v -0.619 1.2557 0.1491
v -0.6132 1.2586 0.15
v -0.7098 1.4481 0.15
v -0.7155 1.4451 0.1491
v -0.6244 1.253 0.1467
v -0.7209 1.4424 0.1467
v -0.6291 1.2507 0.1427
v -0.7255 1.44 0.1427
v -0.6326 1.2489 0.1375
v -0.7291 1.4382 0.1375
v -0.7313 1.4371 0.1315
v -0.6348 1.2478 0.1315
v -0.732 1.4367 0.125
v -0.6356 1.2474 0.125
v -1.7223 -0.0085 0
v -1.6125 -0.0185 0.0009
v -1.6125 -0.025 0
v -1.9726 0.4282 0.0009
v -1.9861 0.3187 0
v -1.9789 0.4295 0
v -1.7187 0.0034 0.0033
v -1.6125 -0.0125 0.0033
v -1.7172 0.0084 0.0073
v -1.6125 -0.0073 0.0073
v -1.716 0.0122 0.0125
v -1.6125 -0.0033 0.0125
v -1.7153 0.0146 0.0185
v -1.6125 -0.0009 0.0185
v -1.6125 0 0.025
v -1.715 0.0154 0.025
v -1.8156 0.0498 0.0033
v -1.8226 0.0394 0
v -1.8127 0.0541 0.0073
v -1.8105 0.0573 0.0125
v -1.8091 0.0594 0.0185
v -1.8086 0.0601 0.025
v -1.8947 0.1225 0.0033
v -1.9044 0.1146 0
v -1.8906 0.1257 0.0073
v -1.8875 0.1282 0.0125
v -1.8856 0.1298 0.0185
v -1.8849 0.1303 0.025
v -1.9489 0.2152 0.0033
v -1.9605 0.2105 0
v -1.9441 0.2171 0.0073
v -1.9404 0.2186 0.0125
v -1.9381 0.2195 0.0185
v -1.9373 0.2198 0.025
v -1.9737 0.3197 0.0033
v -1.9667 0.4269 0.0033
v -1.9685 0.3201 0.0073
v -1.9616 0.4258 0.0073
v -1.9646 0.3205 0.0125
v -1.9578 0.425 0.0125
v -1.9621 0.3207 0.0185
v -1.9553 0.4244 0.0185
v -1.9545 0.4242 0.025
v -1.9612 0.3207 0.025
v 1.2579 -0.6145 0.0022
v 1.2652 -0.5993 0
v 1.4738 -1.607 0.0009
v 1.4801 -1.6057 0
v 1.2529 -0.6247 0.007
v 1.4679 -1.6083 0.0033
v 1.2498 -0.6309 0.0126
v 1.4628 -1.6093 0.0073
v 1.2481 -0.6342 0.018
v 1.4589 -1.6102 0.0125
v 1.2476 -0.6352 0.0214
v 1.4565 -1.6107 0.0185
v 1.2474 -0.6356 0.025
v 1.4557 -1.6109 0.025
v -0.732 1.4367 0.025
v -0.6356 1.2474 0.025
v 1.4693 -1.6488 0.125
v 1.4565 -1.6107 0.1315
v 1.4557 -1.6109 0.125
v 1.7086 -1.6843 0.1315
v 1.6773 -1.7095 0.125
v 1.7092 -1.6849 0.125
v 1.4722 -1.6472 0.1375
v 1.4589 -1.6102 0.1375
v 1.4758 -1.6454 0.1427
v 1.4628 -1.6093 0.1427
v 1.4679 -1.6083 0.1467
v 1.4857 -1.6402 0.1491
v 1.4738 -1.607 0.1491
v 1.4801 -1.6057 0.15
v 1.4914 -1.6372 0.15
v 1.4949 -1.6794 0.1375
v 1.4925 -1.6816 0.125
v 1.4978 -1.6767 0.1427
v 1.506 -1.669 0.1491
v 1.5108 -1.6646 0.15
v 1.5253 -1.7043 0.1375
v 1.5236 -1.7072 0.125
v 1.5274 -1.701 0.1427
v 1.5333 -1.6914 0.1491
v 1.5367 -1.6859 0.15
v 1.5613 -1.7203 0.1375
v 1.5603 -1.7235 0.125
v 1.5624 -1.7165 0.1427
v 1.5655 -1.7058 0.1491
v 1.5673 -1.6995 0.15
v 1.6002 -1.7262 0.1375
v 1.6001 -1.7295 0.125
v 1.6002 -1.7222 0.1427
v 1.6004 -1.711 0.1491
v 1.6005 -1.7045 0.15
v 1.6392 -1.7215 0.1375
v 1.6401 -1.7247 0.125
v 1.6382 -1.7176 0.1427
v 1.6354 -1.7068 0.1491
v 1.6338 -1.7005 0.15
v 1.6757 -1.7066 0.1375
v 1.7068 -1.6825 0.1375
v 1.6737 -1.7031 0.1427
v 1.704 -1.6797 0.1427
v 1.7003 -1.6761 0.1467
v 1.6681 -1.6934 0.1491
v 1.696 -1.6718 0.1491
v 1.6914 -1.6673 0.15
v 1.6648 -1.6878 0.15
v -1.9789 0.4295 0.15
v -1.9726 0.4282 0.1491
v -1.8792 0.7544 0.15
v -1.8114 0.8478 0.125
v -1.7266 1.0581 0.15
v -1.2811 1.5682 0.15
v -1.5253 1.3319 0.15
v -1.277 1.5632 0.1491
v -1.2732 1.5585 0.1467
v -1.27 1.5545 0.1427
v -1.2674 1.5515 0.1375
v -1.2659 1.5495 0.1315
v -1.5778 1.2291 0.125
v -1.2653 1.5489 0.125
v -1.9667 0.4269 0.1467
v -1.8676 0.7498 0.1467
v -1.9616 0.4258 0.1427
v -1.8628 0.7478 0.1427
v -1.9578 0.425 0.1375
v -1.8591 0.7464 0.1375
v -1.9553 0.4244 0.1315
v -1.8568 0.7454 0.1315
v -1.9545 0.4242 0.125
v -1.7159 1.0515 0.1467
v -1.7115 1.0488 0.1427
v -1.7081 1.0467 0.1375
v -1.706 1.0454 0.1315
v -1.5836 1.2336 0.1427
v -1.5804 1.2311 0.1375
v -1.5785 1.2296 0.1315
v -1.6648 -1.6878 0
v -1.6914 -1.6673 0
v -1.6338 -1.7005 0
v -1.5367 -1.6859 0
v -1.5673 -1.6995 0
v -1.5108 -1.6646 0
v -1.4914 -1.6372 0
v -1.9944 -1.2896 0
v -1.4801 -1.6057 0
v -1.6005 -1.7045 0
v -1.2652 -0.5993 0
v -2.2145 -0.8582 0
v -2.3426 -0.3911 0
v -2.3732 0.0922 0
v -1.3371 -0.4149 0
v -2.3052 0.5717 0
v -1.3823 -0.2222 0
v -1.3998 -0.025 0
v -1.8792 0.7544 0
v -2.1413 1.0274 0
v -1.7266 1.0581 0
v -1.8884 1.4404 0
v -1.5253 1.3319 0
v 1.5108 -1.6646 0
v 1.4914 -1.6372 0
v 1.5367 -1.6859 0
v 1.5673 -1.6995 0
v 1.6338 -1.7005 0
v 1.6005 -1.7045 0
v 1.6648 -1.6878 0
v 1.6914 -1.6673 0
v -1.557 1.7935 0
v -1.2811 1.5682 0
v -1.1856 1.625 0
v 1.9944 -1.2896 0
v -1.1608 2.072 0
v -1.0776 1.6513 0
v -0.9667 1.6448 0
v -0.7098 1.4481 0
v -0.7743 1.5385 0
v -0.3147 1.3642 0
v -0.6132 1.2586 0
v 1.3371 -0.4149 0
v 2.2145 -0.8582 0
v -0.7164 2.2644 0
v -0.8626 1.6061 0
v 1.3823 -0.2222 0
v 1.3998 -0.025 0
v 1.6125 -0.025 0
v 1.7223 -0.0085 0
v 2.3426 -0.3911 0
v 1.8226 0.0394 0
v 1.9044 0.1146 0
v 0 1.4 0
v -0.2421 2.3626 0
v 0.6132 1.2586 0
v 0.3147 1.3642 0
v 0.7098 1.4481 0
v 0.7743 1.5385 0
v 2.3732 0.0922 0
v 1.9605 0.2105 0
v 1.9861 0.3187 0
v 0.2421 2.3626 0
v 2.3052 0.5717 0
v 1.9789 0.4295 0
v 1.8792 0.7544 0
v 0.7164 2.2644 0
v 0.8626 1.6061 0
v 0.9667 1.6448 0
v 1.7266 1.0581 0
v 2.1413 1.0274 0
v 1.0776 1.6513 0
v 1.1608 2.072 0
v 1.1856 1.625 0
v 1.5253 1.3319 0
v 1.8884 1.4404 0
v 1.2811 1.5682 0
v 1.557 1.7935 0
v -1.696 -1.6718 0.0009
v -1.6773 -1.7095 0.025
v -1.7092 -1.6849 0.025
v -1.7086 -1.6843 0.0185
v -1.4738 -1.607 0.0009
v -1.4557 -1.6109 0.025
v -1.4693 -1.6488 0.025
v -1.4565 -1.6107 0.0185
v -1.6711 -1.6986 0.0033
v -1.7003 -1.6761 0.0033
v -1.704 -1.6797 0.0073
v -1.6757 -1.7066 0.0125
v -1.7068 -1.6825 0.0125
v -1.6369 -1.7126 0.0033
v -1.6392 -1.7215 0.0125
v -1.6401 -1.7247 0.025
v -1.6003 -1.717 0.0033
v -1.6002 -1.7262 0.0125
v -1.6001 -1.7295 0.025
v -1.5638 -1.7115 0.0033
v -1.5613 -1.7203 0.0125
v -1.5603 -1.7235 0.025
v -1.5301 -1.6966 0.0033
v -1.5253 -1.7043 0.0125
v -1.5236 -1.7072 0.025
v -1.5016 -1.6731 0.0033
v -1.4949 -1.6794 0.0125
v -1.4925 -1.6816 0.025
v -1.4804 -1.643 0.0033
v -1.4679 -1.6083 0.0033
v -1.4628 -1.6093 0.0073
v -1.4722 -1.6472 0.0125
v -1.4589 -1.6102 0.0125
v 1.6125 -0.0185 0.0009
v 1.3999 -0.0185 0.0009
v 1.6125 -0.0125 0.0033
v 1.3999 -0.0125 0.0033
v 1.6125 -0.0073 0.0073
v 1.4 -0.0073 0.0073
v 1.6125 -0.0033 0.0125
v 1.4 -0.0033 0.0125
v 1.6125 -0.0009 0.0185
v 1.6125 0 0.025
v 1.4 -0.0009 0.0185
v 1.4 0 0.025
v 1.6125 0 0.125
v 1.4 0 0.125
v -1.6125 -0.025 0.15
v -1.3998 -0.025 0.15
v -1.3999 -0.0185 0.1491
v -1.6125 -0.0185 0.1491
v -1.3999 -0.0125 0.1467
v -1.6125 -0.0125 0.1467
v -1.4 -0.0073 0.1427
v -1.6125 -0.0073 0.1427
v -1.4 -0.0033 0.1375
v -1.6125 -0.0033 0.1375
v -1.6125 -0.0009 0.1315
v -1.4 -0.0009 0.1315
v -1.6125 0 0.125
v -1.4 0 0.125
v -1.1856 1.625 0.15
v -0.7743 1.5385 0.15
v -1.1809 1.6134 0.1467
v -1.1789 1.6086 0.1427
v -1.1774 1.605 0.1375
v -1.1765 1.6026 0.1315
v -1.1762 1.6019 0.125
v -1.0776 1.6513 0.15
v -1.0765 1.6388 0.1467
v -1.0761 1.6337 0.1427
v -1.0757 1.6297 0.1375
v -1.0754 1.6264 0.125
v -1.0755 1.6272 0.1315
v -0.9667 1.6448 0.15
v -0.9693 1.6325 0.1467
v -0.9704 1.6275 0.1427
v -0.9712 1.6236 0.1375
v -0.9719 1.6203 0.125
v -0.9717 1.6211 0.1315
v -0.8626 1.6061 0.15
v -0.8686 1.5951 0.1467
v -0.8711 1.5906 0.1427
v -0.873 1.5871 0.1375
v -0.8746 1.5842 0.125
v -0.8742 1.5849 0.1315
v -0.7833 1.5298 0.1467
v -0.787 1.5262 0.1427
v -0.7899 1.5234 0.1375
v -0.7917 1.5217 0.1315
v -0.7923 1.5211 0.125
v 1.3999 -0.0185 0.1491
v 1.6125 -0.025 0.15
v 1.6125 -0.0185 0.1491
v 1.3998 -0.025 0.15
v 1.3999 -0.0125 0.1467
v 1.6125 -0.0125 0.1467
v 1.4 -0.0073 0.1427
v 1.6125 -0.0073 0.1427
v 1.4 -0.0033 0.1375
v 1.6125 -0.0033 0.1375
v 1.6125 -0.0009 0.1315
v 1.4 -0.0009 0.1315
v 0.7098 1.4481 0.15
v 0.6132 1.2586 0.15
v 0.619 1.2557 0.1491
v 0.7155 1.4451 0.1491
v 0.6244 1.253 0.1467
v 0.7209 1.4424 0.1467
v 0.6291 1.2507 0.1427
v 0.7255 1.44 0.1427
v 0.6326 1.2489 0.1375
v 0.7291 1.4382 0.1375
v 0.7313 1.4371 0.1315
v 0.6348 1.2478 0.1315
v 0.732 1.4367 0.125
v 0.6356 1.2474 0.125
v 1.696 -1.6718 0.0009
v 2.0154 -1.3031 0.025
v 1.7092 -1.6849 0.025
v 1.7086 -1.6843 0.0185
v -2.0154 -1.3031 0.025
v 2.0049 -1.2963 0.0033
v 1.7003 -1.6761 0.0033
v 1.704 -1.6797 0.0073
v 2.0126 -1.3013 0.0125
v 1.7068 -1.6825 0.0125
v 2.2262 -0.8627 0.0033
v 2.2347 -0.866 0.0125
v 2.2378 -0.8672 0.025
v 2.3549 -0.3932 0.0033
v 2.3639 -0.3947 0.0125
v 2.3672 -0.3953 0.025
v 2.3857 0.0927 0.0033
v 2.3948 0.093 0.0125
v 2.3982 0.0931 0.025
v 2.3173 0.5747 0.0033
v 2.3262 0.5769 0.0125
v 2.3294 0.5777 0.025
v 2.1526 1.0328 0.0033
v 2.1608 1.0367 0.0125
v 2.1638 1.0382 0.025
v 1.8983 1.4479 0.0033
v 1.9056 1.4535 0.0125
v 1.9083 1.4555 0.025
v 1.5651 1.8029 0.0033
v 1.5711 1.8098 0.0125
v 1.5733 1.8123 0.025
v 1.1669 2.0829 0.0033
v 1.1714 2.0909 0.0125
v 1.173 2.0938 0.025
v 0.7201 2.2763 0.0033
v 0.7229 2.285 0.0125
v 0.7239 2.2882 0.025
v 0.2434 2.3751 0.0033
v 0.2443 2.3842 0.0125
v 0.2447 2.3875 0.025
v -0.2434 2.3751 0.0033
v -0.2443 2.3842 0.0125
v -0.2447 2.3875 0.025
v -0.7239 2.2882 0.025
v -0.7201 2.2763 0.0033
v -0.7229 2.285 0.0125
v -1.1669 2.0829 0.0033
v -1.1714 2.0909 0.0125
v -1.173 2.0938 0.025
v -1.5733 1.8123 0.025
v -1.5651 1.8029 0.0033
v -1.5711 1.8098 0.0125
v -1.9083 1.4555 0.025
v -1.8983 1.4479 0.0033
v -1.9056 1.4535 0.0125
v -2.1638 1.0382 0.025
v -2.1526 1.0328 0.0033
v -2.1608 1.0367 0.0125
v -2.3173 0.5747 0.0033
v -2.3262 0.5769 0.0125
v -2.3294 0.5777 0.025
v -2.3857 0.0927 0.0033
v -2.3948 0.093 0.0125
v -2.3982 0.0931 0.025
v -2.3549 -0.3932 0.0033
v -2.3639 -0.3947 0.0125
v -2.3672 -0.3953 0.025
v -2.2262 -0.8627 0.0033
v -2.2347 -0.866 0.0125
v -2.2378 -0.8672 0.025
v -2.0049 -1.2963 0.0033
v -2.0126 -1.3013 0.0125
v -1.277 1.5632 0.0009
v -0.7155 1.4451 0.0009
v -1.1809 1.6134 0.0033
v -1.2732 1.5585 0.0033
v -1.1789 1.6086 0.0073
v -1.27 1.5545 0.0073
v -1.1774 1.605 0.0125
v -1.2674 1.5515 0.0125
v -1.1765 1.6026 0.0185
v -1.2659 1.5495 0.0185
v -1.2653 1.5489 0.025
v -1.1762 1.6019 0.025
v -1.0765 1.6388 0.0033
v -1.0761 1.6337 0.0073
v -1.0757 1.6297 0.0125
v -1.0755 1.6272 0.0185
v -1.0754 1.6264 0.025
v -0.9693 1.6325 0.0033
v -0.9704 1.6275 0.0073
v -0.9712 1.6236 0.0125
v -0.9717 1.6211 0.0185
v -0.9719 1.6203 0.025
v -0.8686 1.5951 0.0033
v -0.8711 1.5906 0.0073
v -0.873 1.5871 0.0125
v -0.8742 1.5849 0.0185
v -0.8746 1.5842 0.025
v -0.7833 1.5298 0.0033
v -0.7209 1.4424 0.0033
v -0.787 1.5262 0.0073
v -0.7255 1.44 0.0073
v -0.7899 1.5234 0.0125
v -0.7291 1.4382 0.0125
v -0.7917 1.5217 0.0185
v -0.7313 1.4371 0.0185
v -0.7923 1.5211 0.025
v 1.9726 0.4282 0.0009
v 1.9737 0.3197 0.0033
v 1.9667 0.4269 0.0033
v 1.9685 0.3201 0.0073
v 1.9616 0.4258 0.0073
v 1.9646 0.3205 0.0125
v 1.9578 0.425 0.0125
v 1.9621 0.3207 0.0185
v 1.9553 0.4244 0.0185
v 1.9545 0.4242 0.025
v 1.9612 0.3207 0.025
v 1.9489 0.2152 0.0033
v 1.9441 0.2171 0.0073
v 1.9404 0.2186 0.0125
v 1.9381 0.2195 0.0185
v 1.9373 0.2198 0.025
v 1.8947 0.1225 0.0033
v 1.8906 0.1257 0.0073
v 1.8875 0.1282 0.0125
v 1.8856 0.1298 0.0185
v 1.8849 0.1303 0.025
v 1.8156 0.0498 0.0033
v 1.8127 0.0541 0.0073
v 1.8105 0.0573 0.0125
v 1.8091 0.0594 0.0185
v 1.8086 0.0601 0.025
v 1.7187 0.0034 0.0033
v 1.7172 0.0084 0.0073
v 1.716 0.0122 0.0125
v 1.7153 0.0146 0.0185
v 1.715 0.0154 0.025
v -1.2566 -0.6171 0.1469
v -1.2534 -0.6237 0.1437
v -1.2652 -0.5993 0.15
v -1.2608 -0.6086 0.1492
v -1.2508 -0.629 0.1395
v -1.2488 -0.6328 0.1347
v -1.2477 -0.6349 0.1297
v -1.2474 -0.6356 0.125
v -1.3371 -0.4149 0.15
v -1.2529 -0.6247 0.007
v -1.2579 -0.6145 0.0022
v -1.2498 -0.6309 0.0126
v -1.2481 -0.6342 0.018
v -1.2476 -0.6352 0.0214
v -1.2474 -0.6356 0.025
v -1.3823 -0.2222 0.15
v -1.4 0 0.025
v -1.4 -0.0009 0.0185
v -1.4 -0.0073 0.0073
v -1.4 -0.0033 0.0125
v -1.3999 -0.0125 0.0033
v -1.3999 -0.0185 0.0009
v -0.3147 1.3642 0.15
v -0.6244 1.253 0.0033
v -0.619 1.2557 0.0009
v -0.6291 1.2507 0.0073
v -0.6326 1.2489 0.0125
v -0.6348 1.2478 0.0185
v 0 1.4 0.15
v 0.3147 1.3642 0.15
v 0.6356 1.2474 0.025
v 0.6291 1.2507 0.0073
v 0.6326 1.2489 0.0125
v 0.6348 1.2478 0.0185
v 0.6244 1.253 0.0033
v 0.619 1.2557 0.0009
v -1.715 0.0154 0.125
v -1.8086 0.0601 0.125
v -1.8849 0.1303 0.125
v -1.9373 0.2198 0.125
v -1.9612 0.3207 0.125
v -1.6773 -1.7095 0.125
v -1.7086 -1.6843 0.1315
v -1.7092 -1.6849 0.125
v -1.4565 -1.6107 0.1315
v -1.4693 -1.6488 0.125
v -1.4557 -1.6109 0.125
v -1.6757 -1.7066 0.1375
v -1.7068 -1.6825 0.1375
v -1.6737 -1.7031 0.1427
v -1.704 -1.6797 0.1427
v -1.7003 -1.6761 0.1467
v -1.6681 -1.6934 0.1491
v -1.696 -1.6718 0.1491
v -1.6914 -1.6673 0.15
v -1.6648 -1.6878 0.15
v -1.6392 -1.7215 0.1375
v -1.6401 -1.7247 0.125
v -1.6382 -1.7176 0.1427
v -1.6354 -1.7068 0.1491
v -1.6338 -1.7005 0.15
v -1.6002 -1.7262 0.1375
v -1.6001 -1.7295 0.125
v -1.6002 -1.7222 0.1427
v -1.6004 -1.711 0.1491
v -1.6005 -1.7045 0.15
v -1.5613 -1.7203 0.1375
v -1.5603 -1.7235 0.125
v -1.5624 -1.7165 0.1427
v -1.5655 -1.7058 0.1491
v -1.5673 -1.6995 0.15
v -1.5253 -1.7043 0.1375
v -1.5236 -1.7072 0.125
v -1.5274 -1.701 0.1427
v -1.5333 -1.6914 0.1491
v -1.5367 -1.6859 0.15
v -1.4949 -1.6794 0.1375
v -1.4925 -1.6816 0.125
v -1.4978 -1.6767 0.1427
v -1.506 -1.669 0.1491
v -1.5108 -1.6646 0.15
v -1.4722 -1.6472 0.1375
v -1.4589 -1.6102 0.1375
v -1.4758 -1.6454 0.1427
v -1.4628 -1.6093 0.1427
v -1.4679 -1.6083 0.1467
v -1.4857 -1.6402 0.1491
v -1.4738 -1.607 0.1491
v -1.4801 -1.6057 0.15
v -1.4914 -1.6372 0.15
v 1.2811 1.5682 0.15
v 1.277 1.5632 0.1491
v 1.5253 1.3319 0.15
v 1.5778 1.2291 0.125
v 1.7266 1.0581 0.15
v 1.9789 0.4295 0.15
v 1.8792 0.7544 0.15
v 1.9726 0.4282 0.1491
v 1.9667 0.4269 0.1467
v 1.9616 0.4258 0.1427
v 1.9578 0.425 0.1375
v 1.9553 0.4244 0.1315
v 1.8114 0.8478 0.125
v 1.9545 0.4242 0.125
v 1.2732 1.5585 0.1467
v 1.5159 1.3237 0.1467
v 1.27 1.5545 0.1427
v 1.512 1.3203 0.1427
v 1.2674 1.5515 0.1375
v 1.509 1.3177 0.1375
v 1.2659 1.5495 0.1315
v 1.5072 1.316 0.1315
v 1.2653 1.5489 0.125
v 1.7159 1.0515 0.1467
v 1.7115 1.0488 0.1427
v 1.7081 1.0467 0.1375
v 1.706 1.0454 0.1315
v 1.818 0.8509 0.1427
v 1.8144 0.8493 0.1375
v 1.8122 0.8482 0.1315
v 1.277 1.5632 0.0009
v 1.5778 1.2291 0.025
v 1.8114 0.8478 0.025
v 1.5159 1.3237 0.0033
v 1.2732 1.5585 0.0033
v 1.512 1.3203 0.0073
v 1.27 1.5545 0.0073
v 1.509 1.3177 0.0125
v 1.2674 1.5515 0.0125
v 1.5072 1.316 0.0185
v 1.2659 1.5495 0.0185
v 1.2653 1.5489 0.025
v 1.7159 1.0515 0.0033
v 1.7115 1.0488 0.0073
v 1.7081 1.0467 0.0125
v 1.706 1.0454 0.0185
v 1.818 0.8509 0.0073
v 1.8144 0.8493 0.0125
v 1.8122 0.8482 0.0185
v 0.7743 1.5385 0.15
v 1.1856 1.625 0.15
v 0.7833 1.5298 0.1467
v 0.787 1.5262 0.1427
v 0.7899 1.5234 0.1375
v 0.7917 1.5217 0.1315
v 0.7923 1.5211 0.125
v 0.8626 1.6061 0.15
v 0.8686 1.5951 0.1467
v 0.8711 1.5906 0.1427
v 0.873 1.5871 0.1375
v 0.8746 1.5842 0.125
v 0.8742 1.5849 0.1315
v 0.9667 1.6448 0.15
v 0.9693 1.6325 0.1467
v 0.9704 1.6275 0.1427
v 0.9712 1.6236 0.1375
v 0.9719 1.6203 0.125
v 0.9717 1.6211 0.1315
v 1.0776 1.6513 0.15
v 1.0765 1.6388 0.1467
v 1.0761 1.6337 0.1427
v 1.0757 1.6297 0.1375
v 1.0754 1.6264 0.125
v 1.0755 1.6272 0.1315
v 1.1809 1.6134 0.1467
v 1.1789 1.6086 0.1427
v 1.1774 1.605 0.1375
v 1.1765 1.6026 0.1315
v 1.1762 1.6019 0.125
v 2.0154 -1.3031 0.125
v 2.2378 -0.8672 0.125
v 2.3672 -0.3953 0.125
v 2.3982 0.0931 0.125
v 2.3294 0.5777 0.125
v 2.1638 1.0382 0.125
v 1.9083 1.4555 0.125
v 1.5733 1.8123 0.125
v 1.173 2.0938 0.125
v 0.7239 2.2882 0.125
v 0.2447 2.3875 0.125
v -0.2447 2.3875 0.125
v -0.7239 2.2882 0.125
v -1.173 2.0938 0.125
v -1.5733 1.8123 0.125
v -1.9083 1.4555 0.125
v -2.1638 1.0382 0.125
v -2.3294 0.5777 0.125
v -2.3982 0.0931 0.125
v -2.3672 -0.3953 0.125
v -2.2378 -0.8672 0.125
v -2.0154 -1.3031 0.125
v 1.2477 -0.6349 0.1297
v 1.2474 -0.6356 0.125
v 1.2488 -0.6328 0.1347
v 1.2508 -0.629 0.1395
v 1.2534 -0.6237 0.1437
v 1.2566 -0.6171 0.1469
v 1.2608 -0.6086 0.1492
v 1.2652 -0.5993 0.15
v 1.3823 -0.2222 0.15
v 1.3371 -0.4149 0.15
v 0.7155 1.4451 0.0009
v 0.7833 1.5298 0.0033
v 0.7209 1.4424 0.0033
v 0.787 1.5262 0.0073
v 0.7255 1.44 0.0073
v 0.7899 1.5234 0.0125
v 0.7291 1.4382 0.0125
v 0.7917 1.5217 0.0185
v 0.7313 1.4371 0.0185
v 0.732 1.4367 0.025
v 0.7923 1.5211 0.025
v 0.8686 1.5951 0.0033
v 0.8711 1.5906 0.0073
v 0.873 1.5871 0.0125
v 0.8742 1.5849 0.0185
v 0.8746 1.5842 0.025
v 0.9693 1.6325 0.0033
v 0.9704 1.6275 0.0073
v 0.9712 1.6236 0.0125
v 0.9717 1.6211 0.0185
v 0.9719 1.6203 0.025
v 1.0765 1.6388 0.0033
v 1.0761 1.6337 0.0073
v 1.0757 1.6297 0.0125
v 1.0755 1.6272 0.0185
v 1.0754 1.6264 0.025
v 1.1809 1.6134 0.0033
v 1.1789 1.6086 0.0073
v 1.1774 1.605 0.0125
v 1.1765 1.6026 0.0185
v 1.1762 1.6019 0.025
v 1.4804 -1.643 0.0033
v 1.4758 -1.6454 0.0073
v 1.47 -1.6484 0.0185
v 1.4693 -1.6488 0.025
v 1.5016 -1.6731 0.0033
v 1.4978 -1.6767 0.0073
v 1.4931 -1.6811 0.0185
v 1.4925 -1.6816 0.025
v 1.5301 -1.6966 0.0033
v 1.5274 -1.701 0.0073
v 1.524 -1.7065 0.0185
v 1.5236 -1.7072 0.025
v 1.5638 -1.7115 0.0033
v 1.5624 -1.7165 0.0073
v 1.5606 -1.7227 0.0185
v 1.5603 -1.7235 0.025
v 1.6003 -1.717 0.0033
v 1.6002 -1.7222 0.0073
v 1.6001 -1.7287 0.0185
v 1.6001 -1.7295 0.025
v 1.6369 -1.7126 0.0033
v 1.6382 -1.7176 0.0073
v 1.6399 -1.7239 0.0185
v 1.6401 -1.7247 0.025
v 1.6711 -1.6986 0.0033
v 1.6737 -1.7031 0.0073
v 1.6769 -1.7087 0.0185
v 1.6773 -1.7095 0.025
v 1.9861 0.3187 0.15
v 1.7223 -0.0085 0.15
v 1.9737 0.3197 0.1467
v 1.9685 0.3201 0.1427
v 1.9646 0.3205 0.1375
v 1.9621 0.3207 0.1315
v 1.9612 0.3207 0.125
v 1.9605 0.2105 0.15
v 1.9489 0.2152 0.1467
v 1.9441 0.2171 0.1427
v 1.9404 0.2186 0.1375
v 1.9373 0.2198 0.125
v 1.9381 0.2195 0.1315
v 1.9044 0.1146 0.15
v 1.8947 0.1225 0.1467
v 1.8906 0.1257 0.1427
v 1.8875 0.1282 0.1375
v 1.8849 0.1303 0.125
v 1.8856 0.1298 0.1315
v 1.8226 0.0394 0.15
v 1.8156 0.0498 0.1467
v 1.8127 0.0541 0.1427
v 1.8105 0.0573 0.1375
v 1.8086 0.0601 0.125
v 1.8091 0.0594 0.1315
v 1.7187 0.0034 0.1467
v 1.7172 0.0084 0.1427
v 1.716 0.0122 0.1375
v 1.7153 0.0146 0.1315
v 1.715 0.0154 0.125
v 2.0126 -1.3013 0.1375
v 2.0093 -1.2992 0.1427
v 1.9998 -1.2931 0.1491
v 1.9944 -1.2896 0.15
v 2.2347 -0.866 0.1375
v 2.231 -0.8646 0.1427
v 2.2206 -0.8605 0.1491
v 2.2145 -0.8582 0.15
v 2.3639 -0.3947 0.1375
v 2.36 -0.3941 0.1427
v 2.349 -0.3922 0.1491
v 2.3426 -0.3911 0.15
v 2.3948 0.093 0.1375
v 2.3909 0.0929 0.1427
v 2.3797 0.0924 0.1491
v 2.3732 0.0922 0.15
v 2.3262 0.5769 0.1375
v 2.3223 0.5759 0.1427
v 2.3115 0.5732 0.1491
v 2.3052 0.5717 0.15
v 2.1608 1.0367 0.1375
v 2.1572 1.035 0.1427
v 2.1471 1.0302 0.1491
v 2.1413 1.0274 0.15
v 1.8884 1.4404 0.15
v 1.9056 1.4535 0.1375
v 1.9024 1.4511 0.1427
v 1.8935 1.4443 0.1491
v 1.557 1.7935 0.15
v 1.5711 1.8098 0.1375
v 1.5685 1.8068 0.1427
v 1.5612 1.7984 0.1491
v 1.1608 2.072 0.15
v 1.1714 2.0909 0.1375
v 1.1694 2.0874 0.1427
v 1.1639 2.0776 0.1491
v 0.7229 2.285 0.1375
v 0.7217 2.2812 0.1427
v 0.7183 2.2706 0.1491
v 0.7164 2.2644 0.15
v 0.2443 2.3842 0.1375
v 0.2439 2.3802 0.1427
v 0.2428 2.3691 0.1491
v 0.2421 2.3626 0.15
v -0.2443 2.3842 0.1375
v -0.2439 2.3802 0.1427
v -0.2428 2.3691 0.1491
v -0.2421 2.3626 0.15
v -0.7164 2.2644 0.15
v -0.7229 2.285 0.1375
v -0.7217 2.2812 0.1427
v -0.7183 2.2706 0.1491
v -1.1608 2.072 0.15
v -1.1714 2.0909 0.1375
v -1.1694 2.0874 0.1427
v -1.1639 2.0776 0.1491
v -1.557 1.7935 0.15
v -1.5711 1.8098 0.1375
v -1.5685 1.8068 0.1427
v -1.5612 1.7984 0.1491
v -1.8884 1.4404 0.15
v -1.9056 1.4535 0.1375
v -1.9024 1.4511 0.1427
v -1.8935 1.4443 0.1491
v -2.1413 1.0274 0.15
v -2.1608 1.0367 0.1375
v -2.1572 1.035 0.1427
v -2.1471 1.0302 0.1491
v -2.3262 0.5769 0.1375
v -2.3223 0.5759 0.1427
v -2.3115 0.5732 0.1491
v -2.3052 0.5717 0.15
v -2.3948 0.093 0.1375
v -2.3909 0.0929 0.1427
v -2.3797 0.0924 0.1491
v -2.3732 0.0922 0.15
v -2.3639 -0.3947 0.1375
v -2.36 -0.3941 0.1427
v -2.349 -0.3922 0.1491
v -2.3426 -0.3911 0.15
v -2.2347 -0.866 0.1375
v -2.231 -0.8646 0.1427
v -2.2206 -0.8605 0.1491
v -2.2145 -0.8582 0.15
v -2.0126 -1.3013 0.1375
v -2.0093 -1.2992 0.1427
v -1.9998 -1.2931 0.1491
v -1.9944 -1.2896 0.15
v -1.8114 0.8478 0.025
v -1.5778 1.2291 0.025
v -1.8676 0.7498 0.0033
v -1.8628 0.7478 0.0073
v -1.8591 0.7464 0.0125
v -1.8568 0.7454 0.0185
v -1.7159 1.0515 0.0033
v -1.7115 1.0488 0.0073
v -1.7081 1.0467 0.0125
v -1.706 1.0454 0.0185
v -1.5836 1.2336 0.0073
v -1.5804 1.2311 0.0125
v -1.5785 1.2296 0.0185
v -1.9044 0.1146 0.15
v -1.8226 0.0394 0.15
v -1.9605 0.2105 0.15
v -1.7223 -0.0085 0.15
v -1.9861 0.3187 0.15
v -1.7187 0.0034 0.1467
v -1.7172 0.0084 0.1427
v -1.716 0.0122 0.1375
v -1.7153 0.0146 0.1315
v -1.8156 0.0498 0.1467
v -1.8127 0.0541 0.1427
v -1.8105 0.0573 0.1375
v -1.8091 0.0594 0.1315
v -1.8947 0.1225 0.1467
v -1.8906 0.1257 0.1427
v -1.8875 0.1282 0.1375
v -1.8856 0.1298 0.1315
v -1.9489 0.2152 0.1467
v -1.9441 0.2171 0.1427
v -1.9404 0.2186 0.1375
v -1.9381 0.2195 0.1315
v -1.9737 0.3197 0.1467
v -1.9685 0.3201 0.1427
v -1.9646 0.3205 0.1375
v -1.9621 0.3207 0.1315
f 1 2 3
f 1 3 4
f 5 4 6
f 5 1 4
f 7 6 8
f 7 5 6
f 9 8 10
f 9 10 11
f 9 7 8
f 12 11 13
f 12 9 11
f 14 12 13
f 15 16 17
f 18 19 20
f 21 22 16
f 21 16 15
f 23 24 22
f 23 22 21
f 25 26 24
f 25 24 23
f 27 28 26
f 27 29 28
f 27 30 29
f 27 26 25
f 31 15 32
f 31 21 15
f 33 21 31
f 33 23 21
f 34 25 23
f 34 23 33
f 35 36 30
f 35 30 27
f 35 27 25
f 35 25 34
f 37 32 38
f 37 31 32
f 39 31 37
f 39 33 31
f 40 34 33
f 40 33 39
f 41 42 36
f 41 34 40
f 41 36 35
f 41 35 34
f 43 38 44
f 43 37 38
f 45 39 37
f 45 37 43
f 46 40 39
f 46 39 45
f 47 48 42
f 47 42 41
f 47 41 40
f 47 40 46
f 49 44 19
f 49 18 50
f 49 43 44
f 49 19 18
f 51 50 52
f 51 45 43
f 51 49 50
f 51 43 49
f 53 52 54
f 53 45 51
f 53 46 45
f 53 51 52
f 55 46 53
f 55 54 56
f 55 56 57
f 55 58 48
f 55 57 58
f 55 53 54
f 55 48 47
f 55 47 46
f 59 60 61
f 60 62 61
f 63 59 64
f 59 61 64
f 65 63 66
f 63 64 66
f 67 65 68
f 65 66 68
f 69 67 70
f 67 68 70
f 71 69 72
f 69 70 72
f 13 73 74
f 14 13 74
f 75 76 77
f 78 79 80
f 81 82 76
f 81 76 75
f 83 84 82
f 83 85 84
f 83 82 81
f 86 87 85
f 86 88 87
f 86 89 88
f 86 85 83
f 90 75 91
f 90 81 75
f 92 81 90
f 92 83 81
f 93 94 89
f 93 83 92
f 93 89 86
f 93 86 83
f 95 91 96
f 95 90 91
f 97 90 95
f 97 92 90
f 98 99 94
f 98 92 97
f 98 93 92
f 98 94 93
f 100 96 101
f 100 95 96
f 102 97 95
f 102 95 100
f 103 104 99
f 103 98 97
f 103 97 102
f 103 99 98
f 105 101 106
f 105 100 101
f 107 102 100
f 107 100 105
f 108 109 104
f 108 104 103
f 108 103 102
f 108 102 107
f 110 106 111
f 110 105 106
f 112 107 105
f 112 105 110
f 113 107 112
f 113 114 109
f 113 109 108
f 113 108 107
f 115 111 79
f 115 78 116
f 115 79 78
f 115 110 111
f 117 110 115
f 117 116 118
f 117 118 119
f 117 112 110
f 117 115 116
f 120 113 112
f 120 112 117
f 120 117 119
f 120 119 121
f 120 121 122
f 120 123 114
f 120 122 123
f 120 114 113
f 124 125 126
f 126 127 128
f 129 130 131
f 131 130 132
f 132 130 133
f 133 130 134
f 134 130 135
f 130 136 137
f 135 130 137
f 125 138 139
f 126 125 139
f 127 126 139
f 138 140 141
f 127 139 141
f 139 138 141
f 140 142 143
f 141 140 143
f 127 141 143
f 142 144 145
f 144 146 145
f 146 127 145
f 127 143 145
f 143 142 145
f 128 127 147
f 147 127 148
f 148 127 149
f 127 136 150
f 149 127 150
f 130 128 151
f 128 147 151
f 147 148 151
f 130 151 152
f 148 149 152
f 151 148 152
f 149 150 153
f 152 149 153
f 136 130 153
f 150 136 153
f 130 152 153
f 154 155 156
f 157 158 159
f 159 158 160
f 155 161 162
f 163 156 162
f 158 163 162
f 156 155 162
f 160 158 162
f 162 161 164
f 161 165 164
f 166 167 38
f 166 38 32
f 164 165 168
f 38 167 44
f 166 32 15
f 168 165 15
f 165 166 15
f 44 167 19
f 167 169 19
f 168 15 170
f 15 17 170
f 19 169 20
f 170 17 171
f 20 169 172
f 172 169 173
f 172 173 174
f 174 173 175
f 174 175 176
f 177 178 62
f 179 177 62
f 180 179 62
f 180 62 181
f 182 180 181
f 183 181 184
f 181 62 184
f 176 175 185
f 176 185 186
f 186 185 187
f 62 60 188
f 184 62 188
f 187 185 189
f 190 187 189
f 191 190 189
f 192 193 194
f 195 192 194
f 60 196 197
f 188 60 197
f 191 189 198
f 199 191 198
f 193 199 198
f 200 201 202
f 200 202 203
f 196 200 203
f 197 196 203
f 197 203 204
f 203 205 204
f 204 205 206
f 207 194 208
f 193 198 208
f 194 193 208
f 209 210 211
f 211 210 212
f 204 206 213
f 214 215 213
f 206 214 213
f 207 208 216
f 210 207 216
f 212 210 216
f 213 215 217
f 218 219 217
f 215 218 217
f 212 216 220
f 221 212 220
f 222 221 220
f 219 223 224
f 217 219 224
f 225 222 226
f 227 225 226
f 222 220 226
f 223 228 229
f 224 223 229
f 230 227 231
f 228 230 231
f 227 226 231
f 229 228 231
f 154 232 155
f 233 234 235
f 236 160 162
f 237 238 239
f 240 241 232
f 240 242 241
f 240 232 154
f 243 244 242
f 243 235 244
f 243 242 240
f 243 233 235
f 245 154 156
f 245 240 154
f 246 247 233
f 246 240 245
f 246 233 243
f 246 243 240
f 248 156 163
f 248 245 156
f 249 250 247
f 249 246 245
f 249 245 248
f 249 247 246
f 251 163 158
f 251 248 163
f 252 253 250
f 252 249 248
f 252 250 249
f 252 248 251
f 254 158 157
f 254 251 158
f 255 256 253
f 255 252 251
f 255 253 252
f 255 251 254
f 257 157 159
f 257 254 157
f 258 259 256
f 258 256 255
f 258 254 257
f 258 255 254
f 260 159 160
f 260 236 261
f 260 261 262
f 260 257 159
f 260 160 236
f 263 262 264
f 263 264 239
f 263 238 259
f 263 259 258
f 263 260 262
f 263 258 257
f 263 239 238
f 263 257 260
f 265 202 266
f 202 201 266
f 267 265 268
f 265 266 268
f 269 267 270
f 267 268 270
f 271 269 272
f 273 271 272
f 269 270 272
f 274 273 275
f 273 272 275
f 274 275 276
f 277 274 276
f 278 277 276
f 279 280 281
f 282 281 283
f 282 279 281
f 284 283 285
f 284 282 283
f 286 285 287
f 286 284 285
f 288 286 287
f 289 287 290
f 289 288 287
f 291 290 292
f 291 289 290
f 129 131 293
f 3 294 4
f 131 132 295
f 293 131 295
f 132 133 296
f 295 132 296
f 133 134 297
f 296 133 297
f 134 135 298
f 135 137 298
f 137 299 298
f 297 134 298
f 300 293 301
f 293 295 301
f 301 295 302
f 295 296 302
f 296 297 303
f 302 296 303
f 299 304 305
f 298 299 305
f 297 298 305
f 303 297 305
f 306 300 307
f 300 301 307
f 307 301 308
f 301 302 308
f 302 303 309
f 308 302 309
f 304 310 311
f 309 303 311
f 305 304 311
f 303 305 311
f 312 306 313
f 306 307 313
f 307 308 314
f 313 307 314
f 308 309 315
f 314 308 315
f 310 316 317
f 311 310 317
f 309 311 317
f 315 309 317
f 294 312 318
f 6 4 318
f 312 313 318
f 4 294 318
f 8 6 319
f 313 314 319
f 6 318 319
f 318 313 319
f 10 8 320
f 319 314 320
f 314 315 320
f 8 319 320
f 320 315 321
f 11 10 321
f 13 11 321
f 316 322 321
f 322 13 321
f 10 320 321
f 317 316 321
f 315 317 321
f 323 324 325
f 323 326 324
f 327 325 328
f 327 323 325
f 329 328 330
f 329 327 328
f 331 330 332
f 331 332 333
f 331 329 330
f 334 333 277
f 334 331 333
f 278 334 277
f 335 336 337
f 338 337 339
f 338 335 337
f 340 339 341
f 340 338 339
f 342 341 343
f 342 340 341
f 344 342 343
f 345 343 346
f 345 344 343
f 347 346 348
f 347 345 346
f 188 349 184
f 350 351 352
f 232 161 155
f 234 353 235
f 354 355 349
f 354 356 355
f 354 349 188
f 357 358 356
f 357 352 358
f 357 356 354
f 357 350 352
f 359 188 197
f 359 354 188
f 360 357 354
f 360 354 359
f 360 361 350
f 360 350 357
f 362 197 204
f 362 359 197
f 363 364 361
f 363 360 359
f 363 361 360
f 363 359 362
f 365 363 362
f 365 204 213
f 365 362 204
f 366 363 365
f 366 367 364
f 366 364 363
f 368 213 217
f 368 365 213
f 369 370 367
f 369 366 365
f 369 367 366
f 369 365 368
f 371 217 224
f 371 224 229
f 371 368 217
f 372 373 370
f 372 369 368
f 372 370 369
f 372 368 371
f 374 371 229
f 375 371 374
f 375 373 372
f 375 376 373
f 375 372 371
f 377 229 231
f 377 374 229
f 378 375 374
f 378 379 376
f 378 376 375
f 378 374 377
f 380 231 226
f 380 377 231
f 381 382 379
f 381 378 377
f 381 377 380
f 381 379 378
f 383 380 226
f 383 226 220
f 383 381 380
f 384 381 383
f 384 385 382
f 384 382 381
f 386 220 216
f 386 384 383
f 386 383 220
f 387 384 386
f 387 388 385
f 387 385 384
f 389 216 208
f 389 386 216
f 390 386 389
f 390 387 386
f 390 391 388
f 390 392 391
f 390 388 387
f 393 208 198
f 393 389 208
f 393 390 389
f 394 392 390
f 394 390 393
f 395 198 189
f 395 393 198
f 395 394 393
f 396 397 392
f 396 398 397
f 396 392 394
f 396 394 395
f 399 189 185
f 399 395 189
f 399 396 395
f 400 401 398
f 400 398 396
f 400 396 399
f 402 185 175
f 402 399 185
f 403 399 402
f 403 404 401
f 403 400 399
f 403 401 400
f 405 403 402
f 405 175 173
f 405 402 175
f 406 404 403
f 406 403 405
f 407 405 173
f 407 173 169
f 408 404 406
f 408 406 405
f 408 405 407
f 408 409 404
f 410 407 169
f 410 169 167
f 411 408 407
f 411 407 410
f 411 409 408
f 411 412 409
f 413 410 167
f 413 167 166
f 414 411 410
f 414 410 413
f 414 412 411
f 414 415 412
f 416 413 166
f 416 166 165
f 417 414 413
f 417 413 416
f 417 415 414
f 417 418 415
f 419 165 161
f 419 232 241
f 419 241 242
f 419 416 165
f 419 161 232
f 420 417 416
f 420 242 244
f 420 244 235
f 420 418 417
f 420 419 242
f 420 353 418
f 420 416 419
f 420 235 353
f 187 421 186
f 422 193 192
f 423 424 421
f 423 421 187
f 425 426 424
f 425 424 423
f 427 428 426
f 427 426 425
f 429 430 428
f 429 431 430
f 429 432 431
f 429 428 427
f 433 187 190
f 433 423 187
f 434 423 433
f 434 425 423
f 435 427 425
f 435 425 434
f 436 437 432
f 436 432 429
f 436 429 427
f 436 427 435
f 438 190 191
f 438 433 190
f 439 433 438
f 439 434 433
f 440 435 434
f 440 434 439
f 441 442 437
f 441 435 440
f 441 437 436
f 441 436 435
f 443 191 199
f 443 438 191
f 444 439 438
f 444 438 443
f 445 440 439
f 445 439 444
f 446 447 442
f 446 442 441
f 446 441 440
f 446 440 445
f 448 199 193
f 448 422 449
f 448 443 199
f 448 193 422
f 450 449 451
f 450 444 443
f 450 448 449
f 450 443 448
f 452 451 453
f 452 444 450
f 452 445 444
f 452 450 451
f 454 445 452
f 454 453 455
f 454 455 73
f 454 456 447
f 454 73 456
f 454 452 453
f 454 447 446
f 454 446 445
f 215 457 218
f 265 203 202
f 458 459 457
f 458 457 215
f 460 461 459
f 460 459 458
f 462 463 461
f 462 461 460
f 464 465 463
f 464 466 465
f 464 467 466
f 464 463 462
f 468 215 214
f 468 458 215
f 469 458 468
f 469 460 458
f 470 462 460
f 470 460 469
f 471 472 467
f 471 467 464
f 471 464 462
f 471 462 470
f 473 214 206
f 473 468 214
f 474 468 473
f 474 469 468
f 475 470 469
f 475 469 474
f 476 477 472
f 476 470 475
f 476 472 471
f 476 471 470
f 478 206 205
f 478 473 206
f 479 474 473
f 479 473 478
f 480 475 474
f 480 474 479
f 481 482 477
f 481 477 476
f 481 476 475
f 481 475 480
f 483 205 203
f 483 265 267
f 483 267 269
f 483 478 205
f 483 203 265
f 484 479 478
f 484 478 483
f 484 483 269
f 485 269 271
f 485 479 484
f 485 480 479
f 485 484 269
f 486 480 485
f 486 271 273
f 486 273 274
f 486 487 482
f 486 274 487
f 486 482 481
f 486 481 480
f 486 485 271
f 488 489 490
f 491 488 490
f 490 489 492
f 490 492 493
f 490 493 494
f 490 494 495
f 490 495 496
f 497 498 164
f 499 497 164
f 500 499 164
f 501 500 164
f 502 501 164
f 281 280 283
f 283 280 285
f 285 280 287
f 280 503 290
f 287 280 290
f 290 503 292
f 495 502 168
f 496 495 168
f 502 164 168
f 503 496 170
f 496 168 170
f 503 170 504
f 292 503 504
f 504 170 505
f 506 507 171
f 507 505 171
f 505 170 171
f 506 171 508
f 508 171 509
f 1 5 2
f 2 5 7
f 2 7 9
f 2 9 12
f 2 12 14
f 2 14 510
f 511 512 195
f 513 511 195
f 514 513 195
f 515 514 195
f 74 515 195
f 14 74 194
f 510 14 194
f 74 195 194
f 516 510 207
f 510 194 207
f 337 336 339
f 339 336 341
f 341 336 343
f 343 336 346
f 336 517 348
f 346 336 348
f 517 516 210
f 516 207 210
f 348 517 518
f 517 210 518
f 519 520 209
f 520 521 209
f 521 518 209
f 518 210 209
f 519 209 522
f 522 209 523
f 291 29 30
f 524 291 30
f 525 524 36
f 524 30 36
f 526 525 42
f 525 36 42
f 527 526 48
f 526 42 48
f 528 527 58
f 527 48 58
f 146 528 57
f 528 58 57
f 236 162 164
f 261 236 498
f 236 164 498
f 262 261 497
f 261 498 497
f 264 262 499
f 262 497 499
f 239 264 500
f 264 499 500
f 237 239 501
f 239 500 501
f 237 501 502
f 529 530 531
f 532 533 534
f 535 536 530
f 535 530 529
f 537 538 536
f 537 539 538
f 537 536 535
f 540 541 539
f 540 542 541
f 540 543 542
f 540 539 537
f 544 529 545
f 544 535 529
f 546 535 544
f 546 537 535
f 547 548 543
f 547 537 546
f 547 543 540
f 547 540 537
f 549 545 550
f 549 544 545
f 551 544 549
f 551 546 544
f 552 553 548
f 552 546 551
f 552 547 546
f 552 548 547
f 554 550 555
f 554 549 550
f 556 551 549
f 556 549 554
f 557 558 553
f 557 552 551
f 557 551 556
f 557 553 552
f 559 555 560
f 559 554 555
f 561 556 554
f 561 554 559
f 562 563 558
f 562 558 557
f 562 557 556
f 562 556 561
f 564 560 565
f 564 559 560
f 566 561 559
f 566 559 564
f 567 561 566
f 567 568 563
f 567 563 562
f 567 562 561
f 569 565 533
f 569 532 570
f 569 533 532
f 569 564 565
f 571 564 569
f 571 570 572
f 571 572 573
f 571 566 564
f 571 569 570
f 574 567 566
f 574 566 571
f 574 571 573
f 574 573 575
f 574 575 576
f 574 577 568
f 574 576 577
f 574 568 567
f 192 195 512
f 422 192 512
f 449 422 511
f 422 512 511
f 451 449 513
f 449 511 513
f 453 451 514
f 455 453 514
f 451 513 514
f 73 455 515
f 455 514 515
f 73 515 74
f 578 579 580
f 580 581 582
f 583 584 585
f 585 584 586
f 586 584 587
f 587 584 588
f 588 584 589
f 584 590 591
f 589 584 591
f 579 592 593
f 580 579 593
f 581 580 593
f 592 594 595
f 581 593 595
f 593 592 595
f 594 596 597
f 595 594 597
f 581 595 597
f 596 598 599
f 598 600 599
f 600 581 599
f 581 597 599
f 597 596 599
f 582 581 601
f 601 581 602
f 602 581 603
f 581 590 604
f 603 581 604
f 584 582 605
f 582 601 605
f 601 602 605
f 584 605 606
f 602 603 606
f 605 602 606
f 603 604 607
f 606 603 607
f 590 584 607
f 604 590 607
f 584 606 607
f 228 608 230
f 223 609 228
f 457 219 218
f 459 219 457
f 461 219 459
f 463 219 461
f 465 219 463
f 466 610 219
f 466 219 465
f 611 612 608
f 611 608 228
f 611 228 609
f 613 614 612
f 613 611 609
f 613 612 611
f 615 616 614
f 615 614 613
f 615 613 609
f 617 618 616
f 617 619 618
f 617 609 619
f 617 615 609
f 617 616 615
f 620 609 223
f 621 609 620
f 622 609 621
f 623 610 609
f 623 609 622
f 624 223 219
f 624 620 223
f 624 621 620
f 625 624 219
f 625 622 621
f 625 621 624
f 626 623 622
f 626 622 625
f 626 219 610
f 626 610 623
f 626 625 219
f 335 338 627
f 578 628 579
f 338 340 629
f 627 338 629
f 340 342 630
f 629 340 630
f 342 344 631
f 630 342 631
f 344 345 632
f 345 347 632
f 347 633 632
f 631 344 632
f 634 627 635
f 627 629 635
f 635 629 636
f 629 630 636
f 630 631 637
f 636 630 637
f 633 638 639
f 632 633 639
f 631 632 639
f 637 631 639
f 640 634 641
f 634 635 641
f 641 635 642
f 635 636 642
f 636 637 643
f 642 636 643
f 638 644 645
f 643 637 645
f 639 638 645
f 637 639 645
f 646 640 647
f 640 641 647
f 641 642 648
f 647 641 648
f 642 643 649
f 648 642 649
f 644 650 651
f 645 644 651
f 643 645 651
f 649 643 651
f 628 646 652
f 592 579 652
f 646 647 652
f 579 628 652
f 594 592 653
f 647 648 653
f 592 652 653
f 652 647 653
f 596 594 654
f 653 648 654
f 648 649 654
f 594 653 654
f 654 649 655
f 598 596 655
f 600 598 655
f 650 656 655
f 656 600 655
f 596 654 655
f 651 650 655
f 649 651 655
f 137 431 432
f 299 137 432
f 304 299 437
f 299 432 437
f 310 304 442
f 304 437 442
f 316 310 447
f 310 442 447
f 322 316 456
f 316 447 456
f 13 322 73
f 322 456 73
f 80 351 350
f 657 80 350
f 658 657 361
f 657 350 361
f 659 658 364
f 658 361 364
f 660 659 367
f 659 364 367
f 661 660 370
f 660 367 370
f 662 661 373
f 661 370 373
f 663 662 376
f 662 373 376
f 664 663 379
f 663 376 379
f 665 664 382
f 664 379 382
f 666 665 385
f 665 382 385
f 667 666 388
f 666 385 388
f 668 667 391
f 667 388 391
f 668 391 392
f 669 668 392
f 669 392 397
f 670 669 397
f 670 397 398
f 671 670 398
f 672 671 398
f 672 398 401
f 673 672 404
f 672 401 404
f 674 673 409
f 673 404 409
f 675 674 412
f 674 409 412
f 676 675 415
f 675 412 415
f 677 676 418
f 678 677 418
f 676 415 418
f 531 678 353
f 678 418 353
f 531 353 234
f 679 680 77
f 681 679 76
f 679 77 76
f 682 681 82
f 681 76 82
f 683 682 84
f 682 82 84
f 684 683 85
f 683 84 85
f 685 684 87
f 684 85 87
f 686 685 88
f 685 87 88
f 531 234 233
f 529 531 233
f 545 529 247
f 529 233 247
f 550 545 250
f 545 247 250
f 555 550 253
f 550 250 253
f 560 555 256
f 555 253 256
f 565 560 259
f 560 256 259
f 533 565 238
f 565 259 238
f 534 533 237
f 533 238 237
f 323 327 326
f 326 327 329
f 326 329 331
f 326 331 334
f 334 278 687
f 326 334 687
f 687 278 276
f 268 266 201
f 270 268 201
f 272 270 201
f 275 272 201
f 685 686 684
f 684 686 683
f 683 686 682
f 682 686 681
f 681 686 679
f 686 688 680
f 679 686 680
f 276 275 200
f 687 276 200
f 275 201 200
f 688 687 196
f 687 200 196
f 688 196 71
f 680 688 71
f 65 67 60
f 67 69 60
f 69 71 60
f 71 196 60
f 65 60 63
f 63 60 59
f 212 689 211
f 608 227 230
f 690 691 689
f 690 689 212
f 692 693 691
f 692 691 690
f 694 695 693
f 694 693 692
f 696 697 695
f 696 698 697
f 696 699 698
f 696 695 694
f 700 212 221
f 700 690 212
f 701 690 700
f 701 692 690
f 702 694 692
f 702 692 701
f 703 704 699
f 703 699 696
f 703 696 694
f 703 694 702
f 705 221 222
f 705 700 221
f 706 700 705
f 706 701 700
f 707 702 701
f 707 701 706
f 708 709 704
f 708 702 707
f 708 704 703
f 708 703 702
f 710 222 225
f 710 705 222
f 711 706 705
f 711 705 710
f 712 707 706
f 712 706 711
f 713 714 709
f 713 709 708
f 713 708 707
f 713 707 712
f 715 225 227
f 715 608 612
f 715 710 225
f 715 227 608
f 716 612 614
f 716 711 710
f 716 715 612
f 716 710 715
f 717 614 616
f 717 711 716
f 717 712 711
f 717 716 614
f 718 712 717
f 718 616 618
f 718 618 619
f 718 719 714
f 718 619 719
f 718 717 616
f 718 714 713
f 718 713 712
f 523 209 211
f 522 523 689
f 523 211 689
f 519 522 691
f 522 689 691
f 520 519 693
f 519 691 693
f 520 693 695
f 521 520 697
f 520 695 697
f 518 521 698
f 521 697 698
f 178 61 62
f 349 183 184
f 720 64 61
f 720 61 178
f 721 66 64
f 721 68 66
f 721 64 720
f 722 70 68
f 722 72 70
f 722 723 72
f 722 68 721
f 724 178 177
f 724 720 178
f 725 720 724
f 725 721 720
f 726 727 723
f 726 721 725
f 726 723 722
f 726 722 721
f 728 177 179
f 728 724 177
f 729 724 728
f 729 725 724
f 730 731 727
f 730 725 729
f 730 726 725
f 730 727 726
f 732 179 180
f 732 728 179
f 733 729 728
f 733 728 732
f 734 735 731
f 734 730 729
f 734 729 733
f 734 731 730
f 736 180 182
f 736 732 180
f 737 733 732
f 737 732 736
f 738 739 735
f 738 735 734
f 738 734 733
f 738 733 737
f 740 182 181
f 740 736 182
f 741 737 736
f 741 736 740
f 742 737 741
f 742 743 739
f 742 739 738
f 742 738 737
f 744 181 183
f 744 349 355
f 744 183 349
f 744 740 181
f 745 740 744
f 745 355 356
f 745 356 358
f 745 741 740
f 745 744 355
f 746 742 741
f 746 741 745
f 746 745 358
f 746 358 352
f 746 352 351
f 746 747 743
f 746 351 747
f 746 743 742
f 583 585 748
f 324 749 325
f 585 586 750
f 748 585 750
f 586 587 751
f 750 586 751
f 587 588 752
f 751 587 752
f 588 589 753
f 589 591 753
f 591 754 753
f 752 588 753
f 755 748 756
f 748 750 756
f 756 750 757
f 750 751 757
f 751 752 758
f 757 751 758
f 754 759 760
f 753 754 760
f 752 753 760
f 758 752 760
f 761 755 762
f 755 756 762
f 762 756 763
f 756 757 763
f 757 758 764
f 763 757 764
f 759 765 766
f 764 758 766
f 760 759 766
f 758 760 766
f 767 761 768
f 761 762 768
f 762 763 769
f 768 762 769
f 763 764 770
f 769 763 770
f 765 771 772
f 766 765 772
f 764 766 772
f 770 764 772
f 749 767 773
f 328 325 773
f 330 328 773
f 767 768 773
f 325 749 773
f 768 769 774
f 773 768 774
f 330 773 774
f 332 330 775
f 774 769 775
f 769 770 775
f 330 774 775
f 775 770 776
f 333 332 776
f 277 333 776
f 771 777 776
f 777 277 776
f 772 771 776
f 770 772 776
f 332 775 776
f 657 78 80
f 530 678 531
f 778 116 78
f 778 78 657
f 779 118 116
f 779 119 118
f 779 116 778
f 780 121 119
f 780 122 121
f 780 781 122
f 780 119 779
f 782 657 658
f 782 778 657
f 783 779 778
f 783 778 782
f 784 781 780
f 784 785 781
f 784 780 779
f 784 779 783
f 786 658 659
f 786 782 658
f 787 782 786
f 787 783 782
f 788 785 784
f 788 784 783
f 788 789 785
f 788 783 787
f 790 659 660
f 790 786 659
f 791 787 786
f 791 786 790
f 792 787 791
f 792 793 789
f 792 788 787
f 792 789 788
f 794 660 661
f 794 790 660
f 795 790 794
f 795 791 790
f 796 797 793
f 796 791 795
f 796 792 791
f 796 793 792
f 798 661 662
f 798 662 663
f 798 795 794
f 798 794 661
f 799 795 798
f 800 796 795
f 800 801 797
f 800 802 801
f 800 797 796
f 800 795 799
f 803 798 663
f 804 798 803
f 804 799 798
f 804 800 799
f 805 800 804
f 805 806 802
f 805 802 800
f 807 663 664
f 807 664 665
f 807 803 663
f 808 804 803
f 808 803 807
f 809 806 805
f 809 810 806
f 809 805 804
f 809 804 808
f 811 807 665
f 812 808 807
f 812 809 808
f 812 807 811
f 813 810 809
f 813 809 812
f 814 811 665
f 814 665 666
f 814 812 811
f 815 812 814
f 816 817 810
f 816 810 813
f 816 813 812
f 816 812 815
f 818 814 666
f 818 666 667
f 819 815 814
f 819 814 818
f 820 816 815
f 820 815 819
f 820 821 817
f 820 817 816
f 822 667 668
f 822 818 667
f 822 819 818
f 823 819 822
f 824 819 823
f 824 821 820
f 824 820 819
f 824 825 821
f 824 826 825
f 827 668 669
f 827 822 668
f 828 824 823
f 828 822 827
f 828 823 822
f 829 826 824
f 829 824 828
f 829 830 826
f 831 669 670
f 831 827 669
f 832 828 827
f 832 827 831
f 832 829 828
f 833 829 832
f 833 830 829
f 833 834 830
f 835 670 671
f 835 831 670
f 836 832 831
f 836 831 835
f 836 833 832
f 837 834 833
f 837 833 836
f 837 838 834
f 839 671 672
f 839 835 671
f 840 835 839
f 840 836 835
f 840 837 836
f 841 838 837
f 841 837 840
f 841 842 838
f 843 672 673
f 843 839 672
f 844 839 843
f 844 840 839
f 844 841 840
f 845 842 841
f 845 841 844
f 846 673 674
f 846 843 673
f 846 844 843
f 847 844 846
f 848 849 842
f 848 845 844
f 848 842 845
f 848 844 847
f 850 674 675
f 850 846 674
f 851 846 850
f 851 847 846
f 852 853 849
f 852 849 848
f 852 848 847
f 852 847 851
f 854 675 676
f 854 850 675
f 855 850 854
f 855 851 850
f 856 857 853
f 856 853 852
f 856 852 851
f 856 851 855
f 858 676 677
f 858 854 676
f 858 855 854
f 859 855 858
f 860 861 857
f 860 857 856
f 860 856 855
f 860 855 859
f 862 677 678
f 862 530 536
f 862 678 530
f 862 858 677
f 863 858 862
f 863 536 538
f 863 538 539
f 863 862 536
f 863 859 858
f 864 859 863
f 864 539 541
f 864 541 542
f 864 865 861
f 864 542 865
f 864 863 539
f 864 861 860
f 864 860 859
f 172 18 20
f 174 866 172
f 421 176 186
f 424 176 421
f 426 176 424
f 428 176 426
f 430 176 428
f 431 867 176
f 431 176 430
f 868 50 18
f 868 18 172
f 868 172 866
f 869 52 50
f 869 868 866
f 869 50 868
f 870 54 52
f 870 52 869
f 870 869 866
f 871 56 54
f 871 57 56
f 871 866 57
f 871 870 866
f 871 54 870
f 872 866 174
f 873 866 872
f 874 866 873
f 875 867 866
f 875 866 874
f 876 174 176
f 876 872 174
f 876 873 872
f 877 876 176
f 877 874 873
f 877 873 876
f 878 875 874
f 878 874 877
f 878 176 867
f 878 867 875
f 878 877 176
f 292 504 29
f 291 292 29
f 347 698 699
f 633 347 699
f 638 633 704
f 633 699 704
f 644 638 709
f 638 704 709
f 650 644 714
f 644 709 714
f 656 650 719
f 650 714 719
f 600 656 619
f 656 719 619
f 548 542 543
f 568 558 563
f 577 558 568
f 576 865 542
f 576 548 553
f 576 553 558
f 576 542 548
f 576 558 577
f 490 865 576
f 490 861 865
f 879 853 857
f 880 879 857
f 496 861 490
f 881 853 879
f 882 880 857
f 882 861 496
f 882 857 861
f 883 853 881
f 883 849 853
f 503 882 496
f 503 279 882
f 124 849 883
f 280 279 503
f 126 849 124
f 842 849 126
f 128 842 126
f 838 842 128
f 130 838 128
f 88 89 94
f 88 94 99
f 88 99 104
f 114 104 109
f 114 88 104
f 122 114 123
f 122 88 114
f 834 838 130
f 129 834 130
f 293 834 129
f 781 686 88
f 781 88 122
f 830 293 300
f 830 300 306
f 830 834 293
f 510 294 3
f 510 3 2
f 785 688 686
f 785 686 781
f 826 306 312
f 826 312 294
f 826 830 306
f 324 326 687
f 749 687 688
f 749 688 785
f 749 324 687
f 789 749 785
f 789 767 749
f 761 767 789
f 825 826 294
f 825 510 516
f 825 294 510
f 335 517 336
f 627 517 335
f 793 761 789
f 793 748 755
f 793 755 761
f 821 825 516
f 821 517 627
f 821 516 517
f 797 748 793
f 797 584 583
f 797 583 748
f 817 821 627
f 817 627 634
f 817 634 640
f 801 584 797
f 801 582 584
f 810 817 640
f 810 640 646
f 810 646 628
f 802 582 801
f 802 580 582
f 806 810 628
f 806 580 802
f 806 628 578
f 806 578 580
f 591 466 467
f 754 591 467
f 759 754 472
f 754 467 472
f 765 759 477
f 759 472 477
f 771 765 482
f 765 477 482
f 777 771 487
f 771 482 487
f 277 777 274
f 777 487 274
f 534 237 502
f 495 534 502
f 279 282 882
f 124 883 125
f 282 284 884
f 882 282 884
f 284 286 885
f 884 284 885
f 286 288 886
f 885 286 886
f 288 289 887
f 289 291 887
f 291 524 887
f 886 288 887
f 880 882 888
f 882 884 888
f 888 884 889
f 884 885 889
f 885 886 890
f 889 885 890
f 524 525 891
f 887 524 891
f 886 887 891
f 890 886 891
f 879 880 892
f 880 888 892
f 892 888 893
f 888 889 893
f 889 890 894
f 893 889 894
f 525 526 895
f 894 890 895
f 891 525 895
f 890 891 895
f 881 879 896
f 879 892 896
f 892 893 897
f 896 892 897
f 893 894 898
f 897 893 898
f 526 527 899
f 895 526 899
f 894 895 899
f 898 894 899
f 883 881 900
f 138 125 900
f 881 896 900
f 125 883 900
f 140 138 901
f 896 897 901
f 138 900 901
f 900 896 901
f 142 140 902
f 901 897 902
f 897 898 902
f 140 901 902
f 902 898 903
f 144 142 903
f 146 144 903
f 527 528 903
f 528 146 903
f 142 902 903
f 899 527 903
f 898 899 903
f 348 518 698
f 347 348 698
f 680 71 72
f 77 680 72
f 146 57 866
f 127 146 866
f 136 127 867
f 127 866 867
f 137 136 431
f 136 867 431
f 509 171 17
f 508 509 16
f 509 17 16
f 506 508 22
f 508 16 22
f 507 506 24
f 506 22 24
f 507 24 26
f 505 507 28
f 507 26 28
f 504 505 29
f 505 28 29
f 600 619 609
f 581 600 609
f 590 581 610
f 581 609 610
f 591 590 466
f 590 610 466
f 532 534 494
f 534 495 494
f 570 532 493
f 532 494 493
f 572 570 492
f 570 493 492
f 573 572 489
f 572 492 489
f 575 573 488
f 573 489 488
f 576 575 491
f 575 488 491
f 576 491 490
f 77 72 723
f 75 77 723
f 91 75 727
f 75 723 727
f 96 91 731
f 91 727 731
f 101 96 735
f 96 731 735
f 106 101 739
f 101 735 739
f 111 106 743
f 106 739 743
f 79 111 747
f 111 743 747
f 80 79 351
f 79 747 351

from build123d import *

# Parameters (mm, degrees)
BOSS_EXTRUDE1_DEPTH = 0.15
FILLET1_R           = 0.025
FILLET2_R           = 0.025


with BuildPart() as part:
    # Sketch1 → Boss-Extrude1 (new body)
    with BuildSketch(Plane.XY):
        with BuildLine():
            Line((-1.4, 0), (-1.61245155, 0))
            ThreePointArc((-1.61245155, 0), (-1.88492618, 0.13032393), (-1.954486727, 0.424242424))
            ThreePointArc((-1.954486727, 0.424242424), (-1.705280329, 1.044997129), (-1.265321174, 1.548858395))
            ThreePointArc((-1.265321174, 1.548858395), (-0.97185805, 1.620315698), (-0.732037685, 1.436704851))
            Line((-0.732037685, 1.436704851), (-0.6355867, 1.247409134))
            ThreePointArc((-0.6355867, 1.247409134), (0, 1.4), (0.6355867, 1.247409134))
            Line((0.6355867, 1.247409134), (0.732037685, 1.436704851))
            ThreePointArc((0.732037685, 1.436704851), (0.97185805, 1.620315698), (1.265321174, 1.548858395))
            ThreePointArc((1.265321174, 1.548858395), (1.705280329, 1.044997129), (1.954486727, 0.424242424))
            ThreePointArc((1.954486727, 0.424242424), (1.88492618, 0.13032393), (1.61245155, 0))
            Line((1.61245155, 0), (1.4, 0))
            ThreePointArc((1.4, 0), (1.361317889, -0.326823509), (1.247409134, -0.6355867))
            Line((1.247409134, -0.6355867), (1.455652054, -1.610875335))
            ThreePointArc((1.455652054, -1.610875335), (1.560324773, -1.723547455), (1.709168439, -1.684857041))
            ThreePointArc((1.709168439, -1.684857041), (0, 2.4), (-1.709168439, -1.684857041))
            ThreePointArc((-1.709168439, -1.684857041), (-1.560324773, -1.723547455), (-1.455652054, -1.610875335))
            Line((-1.455652054, -1.610875335), (-1.247409134, -0.6355867))
            ThreePointArc((-1.247409134, -0.6355867), (-1.361317889, -0.326823509), (-1.4, 0))
        make_face()
    extrude(amount=BOSS_EXTRUDE1_DEPTH)

    # Fillet1
    fillet1_edges = [part.edges().sort_by_distance(p)[0] for p in [
        (1.560324773, -1.723547455, 0.15),
        (0, 2.4, 0.15),
        (-1.560324773, -1.723547455, 0.15),
        (-1.351530594, -1.123231017, 0.15),
        (1.351530594, -1.123231017, 0.15),
    ]]
    fillet(fillet1_edges, radius=FILLET1_R)

    # Fillet2
    fillet2_edges = [part.edges().sort_by_distance(p)[0] for p in [
        (1.506225775, 0, 0),
        (1.88492618, 0.13032393, 0),
        (1.705280329, 1.044997129, 0),
        (0.97185805, 1.620315698, 0),
        (0.683812192, 1.342056992, 0),
        (-0.683812192, 1.342056992, 0),
        (-0.97185805, 1.620315698, 0),
        (-1.705280329, 1.044997129, 0),
        (-1.88492618, 0.13032393, 0),
        (-1.506225775, 0, 0),
        (-1.351530594, -1.123231017, 0),
        (-1.560324773, -1.723547455, 0),
        (0, 2.4, 0),
        (1.560324773, -1.723547455, 0),
        (1.351530594, -1.123231017, 0),
        (-1.506225775, 0, 0.15),
        (-1.88492618, 0.13032393, 0.15),
        (-1.705280329, 1.044997129, 0.15),
        (-0.97185805, 1.620315698, 0.15),
        (-0.683812192, 1.342056992, 0.15),
        (0.683812192, 1.342056992, 0.15),
        (0.97185805, 1.620315698, 0.15),
        (1.705280329, 1.044997129, 0.15),
        (1.88492618, 0.13032393, 0.15),
        (1.506225775, 0, 0.15),
    ]]
    fillet(fillet2_edges, radius=FILLET2_R)


solid = part.part
